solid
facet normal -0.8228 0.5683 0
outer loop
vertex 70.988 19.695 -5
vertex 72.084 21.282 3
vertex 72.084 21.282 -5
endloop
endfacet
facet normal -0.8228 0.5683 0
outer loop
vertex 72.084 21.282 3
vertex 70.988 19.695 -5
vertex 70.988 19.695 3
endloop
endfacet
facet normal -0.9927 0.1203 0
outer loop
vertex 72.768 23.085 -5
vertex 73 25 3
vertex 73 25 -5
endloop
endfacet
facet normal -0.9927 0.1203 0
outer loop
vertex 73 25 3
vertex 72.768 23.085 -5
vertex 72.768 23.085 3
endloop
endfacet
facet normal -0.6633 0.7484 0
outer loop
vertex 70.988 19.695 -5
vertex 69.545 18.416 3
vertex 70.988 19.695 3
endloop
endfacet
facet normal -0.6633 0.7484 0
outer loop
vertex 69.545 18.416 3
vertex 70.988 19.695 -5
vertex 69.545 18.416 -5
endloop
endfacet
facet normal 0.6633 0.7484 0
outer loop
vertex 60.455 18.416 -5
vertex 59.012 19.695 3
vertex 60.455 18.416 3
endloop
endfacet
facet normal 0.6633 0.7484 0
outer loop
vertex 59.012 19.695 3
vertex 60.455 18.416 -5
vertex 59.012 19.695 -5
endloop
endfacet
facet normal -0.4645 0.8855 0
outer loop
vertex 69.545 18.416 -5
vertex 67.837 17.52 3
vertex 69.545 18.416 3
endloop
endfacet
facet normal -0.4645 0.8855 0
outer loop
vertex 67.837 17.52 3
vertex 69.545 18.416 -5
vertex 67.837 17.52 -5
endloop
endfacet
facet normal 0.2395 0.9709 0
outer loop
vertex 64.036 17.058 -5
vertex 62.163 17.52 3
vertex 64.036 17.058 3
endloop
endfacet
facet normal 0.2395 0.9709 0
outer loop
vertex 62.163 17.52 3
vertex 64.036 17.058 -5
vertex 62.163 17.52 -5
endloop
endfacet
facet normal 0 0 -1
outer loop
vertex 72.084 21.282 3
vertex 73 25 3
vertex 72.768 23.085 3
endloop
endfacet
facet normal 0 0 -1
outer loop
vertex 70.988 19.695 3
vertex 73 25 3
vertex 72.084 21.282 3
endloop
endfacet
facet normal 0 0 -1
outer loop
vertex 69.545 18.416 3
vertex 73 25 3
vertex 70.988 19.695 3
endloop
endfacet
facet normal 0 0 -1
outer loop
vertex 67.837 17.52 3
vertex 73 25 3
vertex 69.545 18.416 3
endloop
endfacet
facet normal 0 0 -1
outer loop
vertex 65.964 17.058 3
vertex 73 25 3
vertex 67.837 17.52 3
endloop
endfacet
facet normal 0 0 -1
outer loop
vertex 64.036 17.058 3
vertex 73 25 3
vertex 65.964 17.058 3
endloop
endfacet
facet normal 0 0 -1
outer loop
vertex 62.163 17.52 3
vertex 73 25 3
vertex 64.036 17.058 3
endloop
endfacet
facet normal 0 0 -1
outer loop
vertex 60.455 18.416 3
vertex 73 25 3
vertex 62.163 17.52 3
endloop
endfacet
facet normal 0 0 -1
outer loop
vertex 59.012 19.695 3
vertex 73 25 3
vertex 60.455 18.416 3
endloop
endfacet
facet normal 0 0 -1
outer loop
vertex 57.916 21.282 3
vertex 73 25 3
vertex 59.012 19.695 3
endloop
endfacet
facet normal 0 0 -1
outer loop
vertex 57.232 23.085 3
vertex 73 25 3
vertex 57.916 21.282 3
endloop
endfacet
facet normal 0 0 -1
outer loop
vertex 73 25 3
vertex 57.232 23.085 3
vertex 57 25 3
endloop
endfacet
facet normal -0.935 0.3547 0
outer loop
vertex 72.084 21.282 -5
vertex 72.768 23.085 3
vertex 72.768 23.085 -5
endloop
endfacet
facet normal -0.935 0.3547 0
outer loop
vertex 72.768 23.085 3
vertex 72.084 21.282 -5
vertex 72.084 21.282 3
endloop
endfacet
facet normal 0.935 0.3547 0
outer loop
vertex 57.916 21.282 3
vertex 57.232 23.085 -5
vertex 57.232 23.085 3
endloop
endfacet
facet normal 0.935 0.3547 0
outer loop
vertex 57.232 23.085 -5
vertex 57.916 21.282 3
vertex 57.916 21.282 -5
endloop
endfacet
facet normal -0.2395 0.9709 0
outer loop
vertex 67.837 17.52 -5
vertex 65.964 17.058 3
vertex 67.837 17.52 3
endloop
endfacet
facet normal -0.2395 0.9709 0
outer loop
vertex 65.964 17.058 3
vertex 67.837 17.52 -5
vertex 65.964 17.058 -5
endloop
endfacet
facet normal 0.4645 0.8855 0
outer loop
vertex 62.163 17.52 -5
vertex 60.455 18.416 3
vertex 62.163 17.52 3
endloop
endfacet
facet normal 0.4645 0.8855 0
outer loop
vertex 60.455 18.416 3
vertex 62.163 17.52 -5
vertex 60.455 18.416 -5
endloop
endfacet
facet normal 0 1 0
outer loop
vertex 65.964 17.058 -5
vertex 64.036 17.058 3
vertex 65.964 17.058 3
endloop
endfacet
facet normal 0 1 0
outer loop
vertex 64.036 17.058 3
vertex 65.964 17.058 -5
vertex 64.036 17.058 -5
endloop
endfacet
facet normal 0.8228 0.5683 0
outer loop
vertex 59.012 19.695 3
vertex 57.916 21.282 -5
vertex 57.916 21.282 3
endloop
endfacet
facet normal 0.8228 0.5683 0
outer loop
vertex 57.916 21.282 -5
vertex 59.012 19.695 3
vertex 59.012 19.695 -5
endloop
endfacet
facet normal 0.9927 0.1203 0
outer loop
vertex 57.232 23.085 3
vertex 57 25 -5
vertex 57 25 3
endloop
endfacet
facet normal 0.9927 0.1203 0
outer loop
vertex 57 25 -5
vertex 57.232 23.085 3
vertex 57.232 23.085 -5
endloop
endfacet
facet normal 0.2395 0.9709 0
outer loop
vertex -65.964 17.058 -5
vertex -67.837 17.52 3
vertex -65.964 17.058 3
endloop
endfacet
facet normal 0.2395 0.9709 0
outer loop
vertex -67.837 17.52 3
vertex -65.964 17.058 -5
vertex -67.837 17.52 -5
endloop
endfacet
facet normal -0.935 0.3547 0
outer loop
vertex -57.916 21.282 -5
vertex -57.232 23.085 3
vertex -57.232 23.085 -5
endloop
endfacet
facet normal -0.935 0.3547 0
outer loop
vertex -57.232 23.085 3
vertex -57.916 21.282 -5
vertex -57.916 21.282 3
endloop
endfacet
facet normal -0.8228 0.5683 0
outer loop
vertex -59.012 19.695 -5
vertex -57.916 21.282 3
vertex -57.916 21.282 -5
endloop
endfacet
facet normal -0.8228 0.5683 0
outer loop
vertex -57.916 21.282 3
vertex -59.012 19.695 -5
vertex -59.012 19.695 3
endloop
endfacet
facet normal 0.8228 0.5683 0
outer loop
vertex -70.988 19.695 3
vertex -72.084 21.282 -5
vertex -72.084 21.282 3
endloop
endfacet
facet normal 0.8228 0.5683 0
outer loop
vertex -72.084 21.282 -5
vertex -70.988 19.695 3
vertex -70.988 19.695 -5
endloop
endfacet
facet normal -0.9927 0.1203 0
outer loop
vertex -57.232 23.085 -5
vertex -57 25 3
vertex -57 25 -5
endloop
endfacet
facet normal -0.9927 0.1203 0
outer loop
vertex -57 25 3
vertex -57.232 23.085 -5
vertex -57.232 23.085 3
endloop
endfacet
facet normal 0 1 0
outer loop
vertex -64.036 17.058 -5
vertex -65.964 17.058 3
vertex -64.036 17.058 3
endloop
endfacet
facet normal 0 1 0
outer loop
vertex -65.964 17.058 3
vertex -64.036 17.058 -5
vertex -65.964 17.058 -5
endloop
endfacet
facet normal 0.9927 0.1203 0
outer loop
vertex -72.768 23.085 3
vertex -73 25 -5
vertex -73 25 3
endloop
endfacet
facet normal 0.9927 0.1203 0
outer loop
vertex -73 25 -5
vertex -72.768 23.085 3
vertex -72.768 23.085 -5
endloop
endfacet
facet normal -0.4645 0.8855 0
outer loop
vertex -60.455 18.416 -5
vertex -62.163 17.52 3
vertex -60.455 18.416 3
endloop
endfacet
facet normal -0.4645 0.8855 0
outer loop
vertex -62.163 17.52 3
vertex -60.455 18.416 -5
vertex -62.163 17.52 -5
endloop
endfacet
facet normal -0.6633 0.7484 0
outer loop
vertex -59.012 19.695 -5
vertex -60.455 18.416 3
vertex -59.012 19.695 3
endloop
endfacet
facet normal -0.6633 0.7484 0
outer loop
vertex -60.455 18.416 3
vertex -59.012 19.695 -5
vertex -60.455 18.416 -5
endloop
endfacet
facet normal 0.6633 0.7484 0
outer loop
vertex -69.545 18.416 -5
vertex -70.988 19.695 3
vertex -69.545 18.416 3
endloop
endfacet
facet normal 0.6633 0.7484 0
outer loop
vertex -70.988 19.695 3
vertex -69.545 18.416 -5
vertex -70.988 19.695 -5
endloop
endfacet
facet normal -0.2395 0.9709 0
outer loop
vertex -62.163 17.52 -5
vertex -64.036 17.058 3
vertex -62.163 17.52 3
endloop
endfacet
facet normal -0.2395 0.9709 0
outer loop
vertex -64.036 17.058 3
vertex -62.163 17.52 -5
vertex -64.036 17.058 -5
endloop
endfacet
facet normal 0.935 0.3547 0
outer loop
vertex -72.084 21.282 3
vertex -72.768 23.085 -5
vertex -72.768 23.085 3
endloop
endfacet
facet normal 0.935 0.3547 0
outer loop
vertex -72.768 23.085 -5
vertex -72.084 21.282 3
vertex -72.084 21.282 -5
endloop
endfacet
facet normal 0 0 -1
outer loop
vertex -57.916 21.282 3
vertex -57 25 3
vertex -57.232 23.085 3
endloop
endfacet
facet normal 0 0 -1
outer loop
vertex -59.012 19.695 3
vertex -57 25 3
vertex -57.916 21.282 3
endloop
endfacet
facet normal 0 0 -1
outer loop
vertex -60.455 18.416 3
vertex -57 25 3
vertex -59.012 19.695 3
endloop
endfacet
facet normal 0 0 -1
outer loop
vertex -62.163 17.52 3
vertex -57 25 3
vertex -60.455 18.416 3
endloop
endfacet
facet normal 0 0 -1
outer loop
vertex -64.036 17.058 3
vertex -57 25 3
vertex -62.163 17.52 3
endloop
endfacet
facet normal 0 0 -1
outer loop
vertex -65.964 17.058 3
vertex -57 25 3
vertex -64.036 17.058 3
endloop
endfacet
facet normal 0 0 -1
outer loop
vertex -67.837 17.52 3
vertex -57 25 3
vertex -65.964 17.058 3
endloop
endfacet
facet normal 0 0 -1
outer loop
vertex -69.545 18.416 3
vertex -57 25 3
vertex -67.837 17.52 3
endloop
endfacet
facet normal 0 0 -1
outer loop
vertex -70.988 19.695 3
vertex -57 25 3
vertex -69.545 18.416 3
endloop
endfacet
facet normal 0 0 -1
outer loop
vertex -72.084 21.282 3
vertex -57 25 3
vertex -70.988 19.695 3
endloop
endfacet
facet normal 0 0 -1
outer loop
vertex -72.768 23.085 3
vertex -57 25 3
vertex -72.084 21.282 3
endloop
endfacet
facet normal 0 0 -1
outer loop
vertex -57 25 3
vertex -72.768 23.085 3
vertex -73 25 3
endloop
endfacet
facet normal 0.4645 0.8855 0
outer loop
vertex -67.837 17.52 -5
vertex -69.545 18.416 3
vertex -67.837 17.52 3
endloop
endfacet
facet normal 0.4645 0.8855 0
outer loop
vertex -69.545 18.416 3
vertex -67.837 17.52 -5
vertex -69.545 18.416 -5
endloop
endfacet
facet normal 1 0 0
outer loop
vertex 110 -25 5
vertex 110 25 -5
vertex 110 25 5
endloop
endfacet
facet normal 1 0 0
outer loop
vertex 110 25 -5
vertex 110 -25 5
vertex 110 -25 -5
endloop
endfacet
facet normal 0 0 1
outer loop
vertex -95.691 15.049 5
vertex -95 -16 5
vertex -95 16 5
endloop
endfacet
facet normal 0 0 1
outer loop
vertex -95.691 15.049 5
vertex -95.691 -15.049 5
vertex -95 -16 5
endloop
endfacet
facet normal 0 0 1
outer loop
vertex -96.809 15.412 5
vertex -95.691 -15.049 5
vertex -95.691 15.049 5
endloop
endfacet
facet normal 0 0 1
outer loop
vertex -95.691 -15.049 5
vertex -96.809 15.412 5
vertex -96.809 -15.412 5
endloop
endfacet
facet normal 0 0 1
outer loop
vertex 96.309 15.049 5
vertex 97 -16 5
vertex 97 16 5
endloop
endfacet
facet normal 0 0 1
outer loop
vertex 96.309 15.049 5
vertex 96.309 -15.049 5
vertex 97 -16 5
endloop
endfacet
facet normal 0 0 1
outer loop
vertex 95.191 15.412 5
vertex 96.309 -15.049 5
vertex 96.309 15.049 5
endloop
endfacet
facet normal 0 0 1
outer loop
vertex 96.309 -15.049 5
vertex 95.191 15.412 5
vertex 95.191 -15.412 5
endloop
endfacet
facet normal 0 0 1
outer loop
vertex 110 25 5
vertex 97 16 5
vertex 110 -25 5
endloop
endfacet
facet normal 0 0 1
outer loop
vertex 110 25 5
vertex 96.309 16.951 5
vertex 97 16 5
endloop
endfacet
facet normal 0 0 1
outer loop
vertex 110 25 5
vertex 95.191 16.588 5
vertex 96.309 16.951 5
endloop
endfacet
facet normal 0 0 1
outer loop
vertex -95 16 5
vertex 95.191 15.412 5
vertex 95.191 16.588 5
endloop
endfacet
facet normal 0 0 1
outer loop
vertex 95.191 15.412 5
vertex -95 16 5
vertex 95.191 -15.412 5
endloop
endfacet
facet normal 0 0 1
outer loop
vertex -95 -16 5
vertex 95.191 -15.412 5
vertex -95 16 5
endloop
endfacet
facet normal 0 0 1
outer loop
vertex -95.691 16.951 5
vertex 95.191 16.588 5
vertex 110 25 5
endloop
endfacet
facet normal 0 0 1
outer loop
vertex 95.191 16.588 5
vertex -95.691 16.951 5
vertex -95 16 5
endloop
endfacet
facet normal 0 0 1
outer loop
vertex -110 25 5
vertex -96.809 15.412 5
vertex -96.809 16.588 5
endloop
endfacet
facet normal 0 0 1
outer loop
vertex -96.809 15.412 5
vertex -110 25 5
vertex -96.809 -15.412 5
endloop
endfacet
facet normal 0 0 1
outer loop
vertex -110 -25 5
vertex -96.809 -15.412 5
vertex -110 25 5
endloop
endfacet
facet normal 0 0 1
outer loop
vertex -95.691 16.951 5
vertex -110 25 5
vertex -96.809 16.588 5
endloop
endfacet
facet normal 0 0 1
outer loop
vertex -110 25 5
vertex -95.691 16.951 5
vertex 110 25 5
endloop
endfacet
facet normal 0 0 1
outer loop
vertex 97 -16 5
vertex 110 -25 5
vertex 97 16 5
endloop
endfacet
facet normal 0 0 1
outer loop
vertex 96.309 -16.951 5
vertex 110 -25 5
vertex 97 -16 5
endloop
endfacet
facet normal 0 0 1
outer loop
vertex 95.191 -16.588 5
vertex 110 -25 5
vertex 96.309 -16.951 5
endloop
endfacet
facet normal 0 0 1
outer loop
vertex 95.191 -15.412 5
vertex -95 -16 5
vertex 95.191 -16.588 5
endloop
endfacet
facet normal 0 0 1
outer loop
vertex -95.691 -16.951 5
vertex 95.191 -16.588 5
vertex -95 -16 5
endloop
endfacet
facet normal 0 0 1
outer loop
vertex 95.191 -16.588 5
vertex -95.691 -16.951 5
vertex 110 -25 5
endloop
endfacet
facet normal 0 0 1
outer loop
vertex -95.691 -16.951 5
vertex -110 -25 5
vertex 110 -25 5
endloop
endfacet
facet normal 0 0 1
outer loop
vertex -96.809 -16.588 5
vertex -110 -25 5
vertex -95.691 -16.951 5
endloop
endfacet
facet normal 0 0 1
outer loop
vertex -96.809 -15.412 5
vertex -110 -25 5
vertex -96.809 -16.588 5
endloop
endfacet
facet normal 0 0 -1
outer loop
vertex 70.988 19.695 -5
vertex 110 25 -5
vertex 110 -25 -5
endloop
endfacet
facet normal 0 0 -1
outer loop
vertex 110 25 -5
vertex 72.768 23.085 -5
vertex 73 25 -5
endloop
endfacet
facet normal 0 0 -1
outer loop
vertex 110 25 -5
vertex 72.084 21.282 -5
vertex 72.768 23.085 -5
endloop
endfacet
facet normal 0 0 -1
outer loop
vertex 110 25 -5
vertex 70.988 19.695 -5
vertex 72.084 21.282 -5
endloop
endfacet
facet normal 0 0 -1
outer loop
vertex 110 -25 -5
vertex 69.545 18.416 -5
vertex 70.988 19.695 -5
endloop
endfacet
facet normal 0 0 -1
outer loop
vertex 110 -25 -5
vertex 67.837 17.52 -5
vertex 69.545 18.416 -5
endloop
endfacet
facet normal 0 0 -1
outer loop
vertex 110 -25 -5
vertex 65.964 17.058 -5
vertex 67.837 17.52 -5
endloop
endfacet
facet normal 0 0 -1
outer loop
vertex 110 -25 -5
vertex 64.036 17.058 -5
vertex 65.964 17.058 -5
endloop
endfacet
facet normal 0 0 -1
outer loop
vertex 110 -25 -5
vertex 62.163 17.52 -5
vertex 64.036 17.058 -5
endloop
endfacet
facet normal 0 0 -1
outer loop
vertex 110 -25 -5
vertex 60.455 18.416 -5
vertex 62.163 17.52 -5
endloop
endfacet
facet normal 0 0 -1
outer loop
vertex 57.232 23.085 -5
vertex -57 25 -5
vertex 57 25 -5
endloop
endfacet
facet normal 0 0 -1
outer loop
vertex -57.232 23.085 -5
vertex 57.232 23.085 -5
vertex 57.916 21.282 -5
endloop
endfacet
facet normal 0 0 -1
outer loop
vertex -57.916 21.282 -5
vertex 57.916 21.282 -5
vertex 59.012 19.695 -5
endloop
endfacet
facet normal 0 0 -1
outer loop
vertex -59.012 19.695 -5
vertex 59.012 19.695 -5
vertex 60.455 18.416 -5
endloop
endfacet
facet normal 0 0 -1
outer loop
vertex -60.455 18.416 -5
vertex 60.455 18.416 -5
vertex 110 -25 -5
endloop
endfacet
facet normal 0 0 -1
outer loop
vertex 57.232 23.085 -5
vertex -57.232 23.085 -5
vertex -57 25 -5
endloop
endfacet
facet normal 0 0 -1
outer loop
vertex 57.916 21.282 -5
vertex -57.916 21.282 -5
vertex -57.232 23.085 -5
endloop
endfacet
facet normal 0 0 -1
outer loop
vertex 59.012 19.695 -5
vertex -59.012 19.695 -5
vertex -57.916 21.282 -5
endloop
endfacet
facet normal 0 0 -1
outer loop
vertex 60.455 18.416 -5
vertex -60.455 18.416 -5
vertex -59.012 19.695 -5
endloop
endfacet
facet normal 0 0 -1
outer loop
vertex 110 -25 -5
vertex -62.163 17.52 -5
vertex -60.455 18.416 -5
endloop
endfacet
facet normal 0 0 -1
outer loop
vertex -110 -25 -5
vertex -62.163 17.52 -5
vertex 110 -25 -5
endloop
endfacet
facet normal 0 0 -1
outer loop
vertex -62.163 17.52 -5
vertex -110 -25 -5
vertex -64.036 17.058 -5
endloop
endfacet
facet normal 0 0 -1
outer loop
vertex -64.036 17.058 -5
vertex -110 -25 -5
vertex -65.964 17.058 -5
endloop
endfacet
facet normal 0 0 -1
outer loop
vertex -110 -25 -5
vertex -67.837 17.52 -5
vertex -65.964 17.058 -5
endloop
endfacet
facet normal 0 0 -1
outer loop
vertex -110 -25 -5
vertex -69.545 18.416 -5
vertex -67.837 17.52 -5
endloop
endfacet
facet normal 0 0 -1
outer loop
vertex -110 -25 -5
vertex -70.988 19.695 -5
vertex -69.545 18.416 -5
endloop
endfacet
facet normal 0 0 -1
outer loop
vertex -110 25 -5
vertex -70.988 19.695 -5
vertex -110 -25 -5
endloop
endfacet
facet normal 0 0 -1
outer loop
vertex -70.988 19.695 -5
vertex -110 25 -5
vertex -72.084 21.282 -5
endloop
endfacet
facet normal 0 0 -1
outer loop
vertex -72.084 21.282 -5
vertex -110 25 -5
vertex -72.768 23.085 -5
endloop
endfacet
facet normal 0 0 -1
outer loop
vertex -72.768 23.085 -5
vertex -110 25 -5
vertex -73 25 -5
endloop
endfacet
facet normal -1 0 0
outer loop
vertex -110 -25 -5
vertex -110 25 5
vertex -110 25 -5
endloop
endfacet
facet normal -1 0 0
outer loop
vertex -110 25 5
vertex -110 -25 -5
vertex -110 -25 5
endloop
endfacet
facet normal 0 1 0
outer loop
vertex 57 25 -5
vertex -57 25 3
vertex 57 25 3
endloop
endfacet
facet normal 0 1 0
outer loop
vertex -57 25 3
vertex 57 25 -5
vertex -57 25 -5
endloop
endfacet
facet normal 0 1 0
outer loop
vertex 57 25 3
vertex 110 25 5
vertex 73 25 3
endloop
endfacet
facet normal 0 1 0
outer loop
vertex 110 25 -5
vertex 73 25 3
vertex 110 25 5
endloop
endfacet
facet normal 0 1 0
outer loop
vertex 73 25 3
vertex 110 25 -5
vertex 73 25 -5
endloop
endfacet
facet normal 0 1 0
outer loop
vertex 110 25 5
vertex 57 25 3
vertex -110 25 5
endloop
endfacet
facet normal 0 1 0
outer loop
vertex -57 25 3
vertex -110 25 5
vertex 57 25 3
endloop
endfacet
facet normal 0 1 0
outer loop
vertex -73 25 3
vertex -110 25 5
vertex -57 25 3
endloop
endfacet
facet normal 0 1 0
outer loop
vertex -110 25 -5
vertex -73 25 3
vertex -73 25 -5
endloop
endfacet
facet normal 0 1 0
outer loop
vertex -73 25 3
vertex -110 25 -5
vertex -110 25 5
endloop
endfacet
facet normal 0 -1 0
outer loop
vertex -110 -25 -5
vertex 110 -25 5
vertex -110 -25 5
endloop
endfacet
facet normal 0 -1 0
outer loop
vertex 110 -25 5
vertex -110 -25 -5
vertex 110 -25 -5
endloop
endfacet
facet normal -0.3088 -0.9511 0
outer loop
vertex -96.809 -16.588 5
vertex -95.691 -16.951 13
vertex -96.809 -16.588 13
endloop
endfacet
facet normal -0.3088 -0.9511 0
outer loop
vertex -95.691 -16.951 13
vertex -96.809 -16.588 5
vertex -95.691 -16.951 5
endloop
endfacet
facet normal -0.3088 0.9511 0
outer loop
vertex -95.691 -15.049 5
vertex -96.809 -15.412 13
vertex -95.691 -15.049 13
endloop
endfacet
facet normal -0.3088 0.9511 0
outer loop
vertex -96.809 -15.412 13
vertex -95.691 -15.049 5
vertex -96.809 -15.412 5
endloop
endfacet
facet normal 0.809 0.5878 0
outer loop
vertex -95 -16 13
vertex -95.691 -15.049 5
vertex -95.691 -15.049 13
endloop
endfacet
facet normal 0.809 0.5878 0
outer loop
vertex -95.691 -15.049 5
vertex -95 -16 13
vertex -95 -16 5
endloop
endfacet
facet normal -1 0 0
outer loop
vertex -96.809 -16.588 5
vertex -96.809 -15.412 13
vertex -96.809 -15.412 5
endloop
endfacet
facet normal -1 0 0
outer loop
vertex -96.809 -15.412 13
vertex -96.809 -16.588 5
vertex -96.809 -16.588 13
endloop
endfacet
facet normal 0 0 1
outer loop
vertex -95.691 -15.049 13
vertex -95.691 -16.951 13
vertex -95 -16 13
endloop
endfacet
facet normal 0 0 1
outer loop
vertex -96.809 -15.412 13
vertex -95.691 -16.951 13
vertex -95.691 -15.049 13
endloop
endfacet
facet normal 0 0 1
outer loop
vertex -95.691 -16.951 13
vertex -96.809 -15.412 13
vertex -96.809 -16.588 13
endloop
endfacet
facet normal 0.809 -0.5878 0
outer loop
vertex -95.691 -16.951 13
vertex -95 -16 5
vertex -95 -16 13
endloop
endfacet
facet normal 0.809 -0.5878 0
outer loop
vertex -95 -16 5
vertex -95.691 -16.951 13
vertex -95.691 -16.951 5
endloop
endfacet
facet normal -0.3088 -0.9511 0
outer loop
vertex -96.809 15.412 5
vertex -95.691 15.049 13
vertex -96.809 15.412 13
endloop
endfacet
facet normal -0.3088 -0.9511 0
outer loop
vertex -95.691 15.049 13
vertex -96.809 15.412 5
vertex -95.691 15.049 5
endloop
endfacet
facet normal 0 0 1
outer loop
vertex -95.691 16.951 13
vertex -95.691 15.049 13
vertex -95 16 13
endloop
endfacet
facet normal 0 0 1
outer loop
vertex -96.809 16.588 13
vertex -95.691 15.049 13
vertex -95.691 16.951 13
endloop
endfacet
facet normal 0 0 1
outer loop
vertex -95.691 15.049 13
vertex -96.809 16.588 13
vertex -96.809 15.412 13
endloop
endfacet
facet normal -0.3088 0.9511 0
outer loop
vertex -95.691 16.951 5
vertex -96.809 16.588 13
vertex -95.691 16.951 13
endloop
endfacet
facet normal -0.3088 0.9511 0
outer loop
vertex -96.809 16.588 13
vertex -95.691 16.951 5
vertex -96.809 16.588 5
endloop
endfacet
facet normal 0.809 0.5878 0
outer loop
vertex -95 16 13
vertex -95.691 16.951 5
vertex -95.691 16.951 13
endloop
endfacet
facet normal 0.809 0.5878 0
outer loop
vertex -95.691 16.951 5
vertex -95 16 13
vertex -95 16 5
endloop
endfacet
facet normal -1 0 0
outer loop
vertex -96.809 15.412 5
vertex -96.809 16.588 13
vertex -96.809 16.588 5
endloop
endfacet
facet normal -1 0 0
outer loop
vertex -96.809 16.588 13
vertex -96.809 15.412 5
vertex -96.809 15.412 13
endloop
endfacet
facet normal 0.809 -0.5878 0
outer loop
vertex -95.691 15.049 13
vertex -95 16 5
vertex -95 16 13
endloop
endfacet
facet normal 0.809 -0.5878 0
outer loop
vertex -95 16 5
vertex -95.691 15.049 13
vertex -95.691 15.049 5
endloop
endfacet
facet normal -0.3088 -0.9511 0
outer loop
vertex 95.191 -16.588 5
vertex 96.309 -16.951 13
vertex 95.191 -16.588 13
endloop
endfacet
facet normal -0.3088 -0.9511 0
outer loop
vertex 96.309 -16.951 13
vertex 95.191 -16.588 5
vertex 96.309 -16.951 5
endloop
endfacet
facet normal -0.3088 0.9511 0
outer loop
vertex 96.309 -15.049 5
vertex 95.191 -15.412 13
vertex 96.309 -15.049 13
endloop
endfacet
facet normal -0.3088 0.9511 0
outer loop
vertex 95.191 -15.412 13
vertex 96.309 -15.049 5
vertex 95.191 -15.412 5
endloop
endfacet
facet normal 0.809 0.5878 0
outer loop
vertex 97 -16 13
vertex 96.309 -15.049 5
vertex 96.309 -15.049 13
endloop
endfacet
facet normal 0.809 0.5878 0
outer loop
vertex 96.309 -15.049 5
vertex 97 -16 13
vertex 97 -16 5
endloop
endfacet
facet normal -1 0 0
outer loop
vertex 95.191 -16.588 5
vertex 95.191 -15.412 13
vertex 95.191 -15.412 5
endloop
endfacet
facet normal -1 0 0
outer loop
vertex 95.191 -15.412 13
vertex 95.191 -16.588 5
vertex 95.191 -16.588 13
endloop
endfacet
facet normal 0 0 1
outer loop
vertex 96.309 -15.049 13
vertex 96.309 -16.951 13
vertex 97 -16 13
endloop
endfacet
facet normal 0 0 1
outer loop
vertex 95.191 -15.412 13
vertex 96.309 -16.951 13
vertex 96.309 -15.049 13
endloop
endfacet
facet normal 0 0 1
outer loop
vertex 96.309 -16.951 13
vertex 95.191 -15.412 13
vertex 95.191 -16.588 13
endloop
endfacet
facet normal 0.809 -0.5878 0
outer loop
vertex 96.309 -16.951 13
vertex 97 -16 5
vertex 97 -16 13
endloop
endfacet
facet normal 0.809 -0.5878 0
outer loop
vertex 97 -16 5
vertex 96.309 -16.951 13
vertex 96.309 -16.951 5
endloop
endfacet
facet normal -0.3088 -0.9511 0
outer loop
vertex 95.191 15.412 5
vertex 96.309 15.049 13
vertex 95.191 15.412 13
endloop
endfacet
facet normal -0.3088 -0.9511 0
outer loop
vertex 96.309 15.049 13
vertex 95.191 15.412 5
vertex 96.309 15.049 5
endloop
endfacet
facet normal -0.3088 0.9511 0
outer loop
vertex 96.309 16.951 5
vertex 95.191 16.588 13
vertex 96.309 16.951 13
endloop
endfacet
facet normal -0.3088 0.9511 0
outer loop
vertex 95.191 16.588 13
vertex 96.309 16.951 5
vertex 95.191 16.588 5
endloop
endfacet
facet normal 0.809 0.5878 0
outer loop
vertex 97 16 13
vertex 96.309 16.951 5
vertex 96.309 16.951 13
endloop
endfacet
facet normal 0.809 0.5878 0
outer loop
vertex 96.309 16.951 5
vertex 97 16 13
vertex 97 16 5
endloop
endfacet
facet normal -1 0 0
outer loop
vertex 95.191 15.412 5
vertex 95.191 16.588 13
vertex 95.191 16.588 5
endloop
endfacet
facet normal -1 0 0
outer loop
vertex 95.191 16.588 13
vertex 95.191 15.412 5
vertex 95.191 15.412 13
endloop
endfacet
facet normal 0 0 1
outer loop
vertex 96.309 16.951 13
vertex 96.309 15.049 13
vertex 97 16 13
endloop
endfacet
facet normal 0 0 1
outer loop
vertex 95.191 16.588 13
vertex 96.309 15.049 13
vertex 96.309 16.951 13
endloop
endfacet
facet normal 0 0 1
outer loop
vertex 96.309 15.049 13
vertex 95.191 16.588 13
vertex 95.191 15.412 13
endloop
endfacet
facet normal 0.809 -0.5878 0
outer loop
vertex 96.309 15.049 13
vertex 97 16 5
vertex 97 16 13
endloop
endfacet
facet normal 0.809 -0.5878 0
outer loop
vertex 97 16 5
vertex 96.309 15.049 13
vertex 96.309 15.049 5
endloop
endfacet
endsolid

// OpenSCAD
bar_length = 220;
bar_width = 50;
bar_height = 10;
back_thickness = 2;

bar_distance = 130;
bar_diameter = 16;

knob_diameter = 2;
knob_height = 8;
knob_distance_x = 192;
knob_distance_y = 32;

difference() {
    // The bar holder itself
    cube([bar_length, bar_width, bar_height], center = true);
    
    union() {
        // The holes for the bars
        translate([bar_distance/2, bar_width/2, -bar_height / 2 - 1])
            cylinder(h = bar_height - back_thickness + 1, d = bar_diameter);
        
        translate([-bar_distance/2, bar_width/2, -bar_height / 2 - 1])
            cylinder(h = bar_height - back_thickness + 1, d = bar_diameter);
    }
}

for (knob_x = [-knob_distance_x/2, knob_distance_x/2]) {
    for (knob_y = [-knob_distance_y/2, knob_distance_y/2]) {
        translate([knob_x, knob_y, bar_height / 2])
            cylinder(h = knob_height, d = knob_diameter);
    }
}
